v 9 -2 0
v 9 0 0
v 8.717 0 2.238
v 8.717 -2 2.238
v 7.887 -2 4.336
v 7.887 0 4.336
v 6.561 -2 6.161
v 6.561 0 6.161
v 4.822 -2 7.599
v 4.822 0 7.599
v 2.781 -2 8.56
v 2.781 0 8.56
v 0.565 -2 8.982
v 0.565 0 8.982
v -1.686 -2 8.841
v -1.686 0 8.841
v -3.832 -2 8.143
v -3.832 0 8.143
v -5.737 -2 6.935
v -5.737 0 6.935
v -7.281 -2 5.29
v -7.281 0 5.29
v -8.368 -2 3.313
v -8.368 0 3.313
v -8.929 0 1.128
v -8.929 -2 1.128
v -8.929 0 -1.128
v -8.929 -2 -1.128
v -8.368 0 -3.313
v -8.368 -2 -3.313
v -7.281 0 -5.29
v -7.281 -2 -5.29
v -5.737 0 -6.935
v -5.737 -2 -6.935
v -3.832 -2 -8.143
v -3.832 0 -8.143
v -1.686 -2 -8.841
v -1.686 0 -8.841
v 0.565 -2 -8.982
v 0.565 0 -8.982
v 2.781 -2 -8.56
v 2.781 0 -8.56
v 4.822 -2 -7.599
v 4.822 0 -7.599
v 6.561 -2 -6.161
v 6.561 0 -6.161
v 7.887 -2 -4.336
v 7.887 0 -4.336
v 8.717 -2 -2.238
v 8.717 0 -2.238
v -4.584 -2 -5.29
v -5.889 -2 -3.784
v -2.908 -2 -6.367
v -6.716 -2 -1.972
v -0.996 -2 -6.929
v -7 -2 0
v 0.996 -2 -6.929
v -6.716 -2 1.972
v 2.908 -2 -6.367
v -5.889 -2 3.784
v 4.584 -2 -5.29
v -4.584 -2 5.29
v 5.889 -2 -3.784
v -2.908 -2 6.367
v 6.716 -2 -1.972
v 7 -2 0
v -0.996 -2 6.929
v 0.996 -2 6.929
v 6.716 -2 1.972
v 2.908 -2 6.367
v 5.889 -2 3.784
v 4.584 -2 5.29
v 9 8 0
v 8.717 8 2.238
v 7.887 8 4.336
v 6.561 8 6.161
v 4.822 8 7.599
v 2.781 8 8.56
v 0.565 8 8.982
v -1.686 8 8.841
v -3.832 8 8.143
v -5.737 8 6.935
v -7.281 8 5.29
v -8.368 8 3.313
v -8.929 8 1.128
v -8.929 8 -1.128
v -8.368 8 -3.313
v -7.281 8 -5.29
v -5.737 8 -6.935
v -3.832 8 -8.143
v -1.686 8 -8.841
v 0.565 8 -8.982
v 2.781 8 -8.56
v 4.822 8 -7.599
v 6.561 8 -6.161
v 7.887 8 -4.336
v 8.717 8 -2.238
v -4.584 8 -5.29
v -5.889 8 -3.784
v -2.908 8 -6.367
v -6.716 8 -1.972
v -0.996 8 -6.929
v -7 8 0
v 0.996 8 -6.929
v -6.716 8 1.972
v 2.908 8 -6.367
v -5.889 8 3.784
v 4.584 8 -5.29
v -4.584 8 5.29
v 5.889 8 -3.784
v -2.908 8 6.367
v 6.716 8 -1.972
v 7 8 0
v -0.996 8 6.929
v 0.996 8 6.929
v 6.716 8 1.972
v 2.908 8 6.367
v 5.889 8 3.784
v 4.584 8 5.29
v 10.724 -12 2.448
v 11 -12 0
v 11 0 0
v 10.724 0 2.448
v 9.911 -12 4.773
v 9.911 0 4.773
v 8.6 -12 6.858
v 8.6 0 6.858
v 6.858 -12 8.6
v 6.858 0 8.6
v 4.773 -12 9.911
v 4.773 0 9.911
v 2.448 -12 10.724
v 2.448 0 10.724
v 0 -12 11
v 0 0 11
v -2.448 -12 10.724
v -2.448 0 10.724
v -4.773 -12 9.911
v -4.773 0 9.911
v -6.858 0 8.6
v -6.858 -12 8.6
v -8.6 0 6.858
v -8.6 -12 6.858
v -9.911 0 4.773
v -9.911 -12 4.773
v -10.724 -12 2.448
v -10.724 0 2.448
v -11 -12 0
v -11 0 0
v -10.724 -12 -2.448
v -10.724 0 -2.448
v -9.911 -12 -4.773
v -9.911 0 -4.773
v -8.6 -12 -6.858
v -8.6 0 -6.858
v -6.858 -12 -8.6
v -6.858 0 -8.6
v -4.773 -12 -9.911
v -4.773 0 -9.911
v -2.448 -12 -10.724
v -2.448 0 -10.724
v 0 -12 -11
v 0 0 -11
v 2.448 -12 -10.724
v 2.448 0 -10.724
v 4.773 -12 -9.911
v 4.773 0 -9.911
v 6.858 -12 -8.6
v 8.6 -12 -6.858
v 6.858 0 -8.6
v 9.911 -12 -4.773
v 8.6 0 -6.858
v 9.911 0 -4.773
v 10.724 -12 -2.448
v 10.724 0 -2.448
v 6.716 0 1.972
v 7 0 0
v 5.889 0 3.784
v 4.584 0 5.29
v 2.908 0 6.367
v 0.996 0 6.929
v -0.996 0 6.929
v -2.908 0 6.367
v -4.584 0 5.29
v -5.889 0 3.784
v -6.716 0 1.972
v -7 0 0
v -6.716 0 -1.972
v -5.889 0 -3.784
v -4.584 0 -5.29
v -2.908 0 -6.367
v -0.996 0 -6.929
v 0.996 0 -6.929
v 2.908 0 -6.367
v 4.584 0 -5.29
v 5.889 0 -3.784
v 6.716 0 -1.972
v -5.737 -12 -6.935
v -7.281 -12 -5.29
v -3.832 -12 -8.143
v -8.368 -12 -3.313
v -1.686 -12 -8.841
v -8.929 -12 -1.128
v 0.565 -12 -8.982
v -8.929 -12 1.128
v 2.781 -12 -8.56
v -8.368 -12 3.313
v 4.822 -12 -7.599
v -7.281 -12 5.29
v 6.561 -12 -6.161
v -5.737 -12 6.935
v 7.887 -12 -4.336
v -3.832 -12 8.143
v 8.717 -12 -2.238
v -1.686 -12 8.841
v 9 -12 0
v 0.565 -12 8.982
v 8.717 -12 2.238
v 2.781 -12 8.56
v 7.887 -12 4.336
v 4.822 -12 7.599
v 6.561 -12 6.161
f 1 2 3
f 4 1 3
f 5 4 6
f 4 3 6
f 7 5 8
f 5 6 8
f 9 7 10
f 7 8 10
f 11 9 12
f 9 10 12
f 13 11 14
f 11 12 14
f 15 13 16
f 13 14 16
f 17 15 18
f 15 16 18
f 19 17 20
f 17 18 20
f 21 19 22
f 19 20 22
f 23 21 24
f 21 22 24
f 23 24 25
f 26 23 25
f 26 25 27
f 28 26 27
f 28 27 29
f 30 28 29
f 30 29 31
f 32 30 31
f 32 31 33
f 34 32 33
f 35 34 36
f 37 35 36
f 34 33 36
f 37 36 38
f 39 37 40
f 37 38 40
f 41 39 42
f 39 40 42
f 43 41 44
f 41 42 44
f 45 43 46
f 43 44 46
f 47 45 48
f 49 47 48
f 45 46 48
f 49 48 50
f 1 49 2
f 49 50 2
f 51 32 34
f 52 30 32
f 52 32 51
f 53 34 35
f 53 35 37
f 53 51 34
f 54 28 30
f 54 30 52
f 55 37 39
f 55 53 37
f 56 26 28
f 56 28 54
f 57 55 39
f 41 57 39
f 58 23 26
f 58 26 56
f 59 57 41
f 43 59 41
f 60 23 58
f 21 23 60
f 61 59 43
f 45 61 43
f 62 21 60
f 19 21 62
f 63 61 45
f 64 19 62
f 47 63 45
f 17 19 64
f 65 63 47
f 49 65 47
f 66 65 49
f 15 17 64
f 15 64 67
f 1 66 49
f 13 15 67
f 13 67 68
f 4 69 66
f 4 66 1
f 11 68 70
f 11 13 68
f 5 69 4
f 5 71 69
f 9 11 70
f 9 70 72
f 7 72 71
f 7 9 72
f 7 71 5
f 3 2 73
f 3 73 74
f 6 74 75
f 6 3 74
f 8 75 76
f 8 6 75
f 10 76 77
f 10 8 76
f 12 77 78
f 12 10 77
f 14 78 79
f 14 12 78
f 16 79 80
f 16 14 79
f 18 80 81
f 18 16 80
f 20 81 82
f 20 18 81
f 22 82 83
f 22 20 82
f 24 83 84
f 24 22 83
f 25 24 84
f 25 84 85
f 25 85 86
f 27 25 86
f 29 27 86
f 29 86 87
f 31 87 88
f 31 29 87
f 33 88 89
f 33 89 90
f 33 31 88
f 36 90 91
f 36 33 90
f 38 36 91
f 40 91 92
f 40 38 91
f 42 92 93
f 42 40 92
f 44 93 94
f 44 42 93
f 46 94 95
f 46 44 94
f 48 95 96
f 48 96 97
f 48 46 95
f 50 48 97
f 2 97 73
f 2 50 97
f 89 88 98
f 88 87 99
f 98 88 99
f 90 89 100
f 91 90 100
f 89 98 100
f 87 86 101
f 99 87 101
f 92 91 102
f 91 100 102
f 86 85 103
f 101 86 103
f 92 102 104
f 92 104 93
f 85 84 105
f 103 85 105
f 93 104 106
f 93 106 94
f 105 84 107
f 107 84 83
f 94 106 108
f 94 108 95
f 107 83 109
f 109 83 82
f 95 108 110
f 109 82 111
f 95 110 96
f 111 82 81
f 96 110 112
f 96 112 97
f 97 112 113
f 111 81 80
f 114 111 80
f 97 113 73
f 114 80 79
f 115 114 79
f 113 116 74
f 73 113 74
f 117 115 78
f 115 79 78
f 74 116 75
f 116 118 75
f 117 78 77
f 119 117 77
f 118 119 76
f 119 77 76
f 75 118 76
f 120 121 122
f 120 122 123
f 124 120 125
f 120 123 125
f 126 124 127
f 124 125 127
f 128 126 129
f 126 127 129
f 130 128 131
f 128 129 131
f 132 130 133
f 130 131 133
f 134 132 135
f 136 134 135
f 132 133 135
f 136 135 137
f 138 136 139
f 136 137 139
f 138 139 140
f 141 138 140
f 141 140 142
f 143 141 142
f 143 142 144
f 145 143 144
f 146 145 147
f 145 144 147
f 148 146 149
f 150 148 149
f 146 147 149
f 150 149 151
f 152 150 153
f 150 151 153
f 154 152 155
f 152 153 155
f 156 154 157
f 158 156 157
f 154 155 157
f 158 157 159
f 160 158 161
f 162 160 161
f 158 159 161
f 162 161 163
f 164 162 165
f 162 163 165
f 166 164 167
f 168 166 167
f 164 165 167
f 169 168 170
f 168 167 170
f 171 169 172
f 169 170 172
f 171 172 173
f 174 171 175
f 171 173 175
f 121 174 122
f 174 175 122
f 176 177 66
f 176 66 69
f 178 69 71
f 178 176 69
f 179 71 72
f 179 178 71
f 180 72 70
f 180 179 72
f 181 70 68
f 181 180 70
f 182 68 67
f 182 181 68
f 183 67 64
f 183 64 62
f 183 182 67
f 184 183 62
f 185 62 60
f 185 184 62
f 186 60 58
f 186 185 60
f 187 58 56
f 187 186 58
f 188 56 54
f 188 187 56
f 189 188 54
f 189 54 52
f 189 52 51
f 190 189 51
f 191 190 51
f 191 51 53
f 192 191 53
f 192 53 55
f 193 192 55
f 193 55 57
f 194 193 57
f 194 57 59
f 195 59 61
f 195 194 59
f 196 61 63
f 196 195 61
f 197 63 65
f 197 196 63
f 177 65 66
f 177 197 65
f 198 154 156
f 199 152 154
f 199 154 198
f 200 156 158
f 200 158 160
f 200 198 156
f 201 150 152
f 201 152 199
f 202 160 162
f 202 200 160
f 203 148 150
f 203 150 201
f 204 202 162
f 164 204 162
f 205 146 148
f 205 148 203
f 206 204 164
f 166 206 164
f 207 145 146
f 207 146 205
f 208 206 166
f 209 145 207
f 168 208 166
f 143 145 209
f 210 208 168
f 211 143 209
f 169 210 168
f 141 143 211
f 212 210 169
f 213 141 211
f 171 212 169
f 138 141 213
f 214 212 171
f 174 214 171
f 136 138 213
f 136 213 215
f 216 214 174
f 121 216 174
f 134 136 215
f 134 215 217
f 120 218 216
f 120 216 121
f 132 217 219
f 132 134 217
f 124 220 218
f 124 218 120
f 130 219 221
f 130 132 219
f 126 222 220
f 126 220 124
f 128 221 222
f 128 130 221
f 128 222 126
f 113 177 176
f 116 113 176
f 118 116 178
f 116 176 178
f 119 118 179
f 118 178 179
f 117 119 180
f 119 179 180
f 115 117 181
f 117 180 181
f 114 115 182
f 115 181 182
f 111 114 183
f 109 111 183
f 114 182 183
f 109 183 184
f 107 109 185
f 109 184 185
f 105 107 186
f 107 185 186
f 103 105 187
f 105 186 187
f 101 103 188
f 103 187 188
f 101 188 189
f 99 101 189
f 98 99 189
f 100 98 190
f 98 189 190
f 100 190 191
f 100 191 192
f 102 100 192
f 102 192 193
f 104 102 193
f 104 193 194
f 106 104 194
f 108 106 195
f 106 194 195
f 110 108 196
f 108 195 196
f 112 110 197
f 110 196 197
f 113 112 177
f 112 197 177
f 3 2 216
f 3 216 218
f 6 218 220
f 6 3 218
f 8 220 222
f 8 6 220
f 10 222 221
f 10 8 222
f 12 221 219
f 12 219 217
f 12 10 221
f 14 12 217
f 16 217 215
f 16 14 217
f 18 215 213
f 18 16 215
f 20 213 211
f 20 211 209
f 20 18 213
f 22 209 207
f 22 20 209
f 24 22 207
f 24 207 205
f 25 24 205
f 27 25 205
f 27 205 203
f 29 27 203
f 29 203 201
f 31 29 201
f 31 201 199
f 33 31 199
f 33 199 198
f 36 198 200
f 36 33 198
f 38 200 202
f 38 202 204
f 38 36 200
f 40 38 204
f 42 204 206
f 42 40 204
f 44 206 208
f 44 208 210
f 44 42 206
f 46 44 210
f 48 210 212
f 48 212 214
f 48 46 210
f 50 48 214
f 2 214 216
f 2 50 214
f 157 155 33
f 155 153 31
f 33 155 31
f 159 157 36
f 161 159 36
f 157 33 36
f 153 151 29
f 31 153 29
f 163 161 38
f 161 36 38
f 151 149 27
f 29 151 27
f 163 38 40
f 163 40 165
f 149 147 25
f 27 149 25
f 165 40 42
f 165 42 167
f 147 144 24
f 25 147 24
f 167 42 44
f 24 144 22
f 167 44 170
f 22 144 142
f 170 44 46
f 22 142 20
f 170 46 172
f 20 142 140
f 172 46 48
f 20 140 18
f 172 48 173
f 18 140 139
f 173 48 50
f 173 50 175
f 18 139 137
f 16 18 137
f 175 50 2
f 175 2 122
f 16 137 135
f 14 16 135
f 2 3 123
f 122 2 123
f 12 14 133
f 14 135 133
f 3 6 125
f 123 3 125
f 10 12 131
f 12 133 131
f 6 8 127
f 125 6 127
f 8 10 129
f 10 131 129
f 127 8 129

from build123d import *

# Parameters (mm, degrees)
F0_R          = 11
F0_R_2        = 9
F1_DEPTH      = 12
F0_R_3        = 7
F2_DEPTH      = 8
F2_DEPTH_BACK = 2


# Not quite as in the source:
# - a feature names something its author has since deleted; it is built from what else it names


with BuildPart() as f1:
    # F0 (on Front) → F1 (new body)
    with BuildSketch(Plane.XZ):
        Circle(F0_R)
        Circle(F0_R_2, mode=Mode.SUBTRACT)
    extrude(amount=F1_DEPTH)


with BuildPart() as f2:
    # F0 (on Front) → F2 (new body, two sides)
    with BuildSketch(Plane.XZ) as f2_sk:
        Circle(F0_R_2)
        Circle(F0_R_3, mode=Mode.SUBTRACT)
    extrude(amount=-F2_DEPTH)
    extrude(f2_sk.sketch, amount=F2_DEPTH_BACK)


solid = Compound([f1.part, f2.part])
